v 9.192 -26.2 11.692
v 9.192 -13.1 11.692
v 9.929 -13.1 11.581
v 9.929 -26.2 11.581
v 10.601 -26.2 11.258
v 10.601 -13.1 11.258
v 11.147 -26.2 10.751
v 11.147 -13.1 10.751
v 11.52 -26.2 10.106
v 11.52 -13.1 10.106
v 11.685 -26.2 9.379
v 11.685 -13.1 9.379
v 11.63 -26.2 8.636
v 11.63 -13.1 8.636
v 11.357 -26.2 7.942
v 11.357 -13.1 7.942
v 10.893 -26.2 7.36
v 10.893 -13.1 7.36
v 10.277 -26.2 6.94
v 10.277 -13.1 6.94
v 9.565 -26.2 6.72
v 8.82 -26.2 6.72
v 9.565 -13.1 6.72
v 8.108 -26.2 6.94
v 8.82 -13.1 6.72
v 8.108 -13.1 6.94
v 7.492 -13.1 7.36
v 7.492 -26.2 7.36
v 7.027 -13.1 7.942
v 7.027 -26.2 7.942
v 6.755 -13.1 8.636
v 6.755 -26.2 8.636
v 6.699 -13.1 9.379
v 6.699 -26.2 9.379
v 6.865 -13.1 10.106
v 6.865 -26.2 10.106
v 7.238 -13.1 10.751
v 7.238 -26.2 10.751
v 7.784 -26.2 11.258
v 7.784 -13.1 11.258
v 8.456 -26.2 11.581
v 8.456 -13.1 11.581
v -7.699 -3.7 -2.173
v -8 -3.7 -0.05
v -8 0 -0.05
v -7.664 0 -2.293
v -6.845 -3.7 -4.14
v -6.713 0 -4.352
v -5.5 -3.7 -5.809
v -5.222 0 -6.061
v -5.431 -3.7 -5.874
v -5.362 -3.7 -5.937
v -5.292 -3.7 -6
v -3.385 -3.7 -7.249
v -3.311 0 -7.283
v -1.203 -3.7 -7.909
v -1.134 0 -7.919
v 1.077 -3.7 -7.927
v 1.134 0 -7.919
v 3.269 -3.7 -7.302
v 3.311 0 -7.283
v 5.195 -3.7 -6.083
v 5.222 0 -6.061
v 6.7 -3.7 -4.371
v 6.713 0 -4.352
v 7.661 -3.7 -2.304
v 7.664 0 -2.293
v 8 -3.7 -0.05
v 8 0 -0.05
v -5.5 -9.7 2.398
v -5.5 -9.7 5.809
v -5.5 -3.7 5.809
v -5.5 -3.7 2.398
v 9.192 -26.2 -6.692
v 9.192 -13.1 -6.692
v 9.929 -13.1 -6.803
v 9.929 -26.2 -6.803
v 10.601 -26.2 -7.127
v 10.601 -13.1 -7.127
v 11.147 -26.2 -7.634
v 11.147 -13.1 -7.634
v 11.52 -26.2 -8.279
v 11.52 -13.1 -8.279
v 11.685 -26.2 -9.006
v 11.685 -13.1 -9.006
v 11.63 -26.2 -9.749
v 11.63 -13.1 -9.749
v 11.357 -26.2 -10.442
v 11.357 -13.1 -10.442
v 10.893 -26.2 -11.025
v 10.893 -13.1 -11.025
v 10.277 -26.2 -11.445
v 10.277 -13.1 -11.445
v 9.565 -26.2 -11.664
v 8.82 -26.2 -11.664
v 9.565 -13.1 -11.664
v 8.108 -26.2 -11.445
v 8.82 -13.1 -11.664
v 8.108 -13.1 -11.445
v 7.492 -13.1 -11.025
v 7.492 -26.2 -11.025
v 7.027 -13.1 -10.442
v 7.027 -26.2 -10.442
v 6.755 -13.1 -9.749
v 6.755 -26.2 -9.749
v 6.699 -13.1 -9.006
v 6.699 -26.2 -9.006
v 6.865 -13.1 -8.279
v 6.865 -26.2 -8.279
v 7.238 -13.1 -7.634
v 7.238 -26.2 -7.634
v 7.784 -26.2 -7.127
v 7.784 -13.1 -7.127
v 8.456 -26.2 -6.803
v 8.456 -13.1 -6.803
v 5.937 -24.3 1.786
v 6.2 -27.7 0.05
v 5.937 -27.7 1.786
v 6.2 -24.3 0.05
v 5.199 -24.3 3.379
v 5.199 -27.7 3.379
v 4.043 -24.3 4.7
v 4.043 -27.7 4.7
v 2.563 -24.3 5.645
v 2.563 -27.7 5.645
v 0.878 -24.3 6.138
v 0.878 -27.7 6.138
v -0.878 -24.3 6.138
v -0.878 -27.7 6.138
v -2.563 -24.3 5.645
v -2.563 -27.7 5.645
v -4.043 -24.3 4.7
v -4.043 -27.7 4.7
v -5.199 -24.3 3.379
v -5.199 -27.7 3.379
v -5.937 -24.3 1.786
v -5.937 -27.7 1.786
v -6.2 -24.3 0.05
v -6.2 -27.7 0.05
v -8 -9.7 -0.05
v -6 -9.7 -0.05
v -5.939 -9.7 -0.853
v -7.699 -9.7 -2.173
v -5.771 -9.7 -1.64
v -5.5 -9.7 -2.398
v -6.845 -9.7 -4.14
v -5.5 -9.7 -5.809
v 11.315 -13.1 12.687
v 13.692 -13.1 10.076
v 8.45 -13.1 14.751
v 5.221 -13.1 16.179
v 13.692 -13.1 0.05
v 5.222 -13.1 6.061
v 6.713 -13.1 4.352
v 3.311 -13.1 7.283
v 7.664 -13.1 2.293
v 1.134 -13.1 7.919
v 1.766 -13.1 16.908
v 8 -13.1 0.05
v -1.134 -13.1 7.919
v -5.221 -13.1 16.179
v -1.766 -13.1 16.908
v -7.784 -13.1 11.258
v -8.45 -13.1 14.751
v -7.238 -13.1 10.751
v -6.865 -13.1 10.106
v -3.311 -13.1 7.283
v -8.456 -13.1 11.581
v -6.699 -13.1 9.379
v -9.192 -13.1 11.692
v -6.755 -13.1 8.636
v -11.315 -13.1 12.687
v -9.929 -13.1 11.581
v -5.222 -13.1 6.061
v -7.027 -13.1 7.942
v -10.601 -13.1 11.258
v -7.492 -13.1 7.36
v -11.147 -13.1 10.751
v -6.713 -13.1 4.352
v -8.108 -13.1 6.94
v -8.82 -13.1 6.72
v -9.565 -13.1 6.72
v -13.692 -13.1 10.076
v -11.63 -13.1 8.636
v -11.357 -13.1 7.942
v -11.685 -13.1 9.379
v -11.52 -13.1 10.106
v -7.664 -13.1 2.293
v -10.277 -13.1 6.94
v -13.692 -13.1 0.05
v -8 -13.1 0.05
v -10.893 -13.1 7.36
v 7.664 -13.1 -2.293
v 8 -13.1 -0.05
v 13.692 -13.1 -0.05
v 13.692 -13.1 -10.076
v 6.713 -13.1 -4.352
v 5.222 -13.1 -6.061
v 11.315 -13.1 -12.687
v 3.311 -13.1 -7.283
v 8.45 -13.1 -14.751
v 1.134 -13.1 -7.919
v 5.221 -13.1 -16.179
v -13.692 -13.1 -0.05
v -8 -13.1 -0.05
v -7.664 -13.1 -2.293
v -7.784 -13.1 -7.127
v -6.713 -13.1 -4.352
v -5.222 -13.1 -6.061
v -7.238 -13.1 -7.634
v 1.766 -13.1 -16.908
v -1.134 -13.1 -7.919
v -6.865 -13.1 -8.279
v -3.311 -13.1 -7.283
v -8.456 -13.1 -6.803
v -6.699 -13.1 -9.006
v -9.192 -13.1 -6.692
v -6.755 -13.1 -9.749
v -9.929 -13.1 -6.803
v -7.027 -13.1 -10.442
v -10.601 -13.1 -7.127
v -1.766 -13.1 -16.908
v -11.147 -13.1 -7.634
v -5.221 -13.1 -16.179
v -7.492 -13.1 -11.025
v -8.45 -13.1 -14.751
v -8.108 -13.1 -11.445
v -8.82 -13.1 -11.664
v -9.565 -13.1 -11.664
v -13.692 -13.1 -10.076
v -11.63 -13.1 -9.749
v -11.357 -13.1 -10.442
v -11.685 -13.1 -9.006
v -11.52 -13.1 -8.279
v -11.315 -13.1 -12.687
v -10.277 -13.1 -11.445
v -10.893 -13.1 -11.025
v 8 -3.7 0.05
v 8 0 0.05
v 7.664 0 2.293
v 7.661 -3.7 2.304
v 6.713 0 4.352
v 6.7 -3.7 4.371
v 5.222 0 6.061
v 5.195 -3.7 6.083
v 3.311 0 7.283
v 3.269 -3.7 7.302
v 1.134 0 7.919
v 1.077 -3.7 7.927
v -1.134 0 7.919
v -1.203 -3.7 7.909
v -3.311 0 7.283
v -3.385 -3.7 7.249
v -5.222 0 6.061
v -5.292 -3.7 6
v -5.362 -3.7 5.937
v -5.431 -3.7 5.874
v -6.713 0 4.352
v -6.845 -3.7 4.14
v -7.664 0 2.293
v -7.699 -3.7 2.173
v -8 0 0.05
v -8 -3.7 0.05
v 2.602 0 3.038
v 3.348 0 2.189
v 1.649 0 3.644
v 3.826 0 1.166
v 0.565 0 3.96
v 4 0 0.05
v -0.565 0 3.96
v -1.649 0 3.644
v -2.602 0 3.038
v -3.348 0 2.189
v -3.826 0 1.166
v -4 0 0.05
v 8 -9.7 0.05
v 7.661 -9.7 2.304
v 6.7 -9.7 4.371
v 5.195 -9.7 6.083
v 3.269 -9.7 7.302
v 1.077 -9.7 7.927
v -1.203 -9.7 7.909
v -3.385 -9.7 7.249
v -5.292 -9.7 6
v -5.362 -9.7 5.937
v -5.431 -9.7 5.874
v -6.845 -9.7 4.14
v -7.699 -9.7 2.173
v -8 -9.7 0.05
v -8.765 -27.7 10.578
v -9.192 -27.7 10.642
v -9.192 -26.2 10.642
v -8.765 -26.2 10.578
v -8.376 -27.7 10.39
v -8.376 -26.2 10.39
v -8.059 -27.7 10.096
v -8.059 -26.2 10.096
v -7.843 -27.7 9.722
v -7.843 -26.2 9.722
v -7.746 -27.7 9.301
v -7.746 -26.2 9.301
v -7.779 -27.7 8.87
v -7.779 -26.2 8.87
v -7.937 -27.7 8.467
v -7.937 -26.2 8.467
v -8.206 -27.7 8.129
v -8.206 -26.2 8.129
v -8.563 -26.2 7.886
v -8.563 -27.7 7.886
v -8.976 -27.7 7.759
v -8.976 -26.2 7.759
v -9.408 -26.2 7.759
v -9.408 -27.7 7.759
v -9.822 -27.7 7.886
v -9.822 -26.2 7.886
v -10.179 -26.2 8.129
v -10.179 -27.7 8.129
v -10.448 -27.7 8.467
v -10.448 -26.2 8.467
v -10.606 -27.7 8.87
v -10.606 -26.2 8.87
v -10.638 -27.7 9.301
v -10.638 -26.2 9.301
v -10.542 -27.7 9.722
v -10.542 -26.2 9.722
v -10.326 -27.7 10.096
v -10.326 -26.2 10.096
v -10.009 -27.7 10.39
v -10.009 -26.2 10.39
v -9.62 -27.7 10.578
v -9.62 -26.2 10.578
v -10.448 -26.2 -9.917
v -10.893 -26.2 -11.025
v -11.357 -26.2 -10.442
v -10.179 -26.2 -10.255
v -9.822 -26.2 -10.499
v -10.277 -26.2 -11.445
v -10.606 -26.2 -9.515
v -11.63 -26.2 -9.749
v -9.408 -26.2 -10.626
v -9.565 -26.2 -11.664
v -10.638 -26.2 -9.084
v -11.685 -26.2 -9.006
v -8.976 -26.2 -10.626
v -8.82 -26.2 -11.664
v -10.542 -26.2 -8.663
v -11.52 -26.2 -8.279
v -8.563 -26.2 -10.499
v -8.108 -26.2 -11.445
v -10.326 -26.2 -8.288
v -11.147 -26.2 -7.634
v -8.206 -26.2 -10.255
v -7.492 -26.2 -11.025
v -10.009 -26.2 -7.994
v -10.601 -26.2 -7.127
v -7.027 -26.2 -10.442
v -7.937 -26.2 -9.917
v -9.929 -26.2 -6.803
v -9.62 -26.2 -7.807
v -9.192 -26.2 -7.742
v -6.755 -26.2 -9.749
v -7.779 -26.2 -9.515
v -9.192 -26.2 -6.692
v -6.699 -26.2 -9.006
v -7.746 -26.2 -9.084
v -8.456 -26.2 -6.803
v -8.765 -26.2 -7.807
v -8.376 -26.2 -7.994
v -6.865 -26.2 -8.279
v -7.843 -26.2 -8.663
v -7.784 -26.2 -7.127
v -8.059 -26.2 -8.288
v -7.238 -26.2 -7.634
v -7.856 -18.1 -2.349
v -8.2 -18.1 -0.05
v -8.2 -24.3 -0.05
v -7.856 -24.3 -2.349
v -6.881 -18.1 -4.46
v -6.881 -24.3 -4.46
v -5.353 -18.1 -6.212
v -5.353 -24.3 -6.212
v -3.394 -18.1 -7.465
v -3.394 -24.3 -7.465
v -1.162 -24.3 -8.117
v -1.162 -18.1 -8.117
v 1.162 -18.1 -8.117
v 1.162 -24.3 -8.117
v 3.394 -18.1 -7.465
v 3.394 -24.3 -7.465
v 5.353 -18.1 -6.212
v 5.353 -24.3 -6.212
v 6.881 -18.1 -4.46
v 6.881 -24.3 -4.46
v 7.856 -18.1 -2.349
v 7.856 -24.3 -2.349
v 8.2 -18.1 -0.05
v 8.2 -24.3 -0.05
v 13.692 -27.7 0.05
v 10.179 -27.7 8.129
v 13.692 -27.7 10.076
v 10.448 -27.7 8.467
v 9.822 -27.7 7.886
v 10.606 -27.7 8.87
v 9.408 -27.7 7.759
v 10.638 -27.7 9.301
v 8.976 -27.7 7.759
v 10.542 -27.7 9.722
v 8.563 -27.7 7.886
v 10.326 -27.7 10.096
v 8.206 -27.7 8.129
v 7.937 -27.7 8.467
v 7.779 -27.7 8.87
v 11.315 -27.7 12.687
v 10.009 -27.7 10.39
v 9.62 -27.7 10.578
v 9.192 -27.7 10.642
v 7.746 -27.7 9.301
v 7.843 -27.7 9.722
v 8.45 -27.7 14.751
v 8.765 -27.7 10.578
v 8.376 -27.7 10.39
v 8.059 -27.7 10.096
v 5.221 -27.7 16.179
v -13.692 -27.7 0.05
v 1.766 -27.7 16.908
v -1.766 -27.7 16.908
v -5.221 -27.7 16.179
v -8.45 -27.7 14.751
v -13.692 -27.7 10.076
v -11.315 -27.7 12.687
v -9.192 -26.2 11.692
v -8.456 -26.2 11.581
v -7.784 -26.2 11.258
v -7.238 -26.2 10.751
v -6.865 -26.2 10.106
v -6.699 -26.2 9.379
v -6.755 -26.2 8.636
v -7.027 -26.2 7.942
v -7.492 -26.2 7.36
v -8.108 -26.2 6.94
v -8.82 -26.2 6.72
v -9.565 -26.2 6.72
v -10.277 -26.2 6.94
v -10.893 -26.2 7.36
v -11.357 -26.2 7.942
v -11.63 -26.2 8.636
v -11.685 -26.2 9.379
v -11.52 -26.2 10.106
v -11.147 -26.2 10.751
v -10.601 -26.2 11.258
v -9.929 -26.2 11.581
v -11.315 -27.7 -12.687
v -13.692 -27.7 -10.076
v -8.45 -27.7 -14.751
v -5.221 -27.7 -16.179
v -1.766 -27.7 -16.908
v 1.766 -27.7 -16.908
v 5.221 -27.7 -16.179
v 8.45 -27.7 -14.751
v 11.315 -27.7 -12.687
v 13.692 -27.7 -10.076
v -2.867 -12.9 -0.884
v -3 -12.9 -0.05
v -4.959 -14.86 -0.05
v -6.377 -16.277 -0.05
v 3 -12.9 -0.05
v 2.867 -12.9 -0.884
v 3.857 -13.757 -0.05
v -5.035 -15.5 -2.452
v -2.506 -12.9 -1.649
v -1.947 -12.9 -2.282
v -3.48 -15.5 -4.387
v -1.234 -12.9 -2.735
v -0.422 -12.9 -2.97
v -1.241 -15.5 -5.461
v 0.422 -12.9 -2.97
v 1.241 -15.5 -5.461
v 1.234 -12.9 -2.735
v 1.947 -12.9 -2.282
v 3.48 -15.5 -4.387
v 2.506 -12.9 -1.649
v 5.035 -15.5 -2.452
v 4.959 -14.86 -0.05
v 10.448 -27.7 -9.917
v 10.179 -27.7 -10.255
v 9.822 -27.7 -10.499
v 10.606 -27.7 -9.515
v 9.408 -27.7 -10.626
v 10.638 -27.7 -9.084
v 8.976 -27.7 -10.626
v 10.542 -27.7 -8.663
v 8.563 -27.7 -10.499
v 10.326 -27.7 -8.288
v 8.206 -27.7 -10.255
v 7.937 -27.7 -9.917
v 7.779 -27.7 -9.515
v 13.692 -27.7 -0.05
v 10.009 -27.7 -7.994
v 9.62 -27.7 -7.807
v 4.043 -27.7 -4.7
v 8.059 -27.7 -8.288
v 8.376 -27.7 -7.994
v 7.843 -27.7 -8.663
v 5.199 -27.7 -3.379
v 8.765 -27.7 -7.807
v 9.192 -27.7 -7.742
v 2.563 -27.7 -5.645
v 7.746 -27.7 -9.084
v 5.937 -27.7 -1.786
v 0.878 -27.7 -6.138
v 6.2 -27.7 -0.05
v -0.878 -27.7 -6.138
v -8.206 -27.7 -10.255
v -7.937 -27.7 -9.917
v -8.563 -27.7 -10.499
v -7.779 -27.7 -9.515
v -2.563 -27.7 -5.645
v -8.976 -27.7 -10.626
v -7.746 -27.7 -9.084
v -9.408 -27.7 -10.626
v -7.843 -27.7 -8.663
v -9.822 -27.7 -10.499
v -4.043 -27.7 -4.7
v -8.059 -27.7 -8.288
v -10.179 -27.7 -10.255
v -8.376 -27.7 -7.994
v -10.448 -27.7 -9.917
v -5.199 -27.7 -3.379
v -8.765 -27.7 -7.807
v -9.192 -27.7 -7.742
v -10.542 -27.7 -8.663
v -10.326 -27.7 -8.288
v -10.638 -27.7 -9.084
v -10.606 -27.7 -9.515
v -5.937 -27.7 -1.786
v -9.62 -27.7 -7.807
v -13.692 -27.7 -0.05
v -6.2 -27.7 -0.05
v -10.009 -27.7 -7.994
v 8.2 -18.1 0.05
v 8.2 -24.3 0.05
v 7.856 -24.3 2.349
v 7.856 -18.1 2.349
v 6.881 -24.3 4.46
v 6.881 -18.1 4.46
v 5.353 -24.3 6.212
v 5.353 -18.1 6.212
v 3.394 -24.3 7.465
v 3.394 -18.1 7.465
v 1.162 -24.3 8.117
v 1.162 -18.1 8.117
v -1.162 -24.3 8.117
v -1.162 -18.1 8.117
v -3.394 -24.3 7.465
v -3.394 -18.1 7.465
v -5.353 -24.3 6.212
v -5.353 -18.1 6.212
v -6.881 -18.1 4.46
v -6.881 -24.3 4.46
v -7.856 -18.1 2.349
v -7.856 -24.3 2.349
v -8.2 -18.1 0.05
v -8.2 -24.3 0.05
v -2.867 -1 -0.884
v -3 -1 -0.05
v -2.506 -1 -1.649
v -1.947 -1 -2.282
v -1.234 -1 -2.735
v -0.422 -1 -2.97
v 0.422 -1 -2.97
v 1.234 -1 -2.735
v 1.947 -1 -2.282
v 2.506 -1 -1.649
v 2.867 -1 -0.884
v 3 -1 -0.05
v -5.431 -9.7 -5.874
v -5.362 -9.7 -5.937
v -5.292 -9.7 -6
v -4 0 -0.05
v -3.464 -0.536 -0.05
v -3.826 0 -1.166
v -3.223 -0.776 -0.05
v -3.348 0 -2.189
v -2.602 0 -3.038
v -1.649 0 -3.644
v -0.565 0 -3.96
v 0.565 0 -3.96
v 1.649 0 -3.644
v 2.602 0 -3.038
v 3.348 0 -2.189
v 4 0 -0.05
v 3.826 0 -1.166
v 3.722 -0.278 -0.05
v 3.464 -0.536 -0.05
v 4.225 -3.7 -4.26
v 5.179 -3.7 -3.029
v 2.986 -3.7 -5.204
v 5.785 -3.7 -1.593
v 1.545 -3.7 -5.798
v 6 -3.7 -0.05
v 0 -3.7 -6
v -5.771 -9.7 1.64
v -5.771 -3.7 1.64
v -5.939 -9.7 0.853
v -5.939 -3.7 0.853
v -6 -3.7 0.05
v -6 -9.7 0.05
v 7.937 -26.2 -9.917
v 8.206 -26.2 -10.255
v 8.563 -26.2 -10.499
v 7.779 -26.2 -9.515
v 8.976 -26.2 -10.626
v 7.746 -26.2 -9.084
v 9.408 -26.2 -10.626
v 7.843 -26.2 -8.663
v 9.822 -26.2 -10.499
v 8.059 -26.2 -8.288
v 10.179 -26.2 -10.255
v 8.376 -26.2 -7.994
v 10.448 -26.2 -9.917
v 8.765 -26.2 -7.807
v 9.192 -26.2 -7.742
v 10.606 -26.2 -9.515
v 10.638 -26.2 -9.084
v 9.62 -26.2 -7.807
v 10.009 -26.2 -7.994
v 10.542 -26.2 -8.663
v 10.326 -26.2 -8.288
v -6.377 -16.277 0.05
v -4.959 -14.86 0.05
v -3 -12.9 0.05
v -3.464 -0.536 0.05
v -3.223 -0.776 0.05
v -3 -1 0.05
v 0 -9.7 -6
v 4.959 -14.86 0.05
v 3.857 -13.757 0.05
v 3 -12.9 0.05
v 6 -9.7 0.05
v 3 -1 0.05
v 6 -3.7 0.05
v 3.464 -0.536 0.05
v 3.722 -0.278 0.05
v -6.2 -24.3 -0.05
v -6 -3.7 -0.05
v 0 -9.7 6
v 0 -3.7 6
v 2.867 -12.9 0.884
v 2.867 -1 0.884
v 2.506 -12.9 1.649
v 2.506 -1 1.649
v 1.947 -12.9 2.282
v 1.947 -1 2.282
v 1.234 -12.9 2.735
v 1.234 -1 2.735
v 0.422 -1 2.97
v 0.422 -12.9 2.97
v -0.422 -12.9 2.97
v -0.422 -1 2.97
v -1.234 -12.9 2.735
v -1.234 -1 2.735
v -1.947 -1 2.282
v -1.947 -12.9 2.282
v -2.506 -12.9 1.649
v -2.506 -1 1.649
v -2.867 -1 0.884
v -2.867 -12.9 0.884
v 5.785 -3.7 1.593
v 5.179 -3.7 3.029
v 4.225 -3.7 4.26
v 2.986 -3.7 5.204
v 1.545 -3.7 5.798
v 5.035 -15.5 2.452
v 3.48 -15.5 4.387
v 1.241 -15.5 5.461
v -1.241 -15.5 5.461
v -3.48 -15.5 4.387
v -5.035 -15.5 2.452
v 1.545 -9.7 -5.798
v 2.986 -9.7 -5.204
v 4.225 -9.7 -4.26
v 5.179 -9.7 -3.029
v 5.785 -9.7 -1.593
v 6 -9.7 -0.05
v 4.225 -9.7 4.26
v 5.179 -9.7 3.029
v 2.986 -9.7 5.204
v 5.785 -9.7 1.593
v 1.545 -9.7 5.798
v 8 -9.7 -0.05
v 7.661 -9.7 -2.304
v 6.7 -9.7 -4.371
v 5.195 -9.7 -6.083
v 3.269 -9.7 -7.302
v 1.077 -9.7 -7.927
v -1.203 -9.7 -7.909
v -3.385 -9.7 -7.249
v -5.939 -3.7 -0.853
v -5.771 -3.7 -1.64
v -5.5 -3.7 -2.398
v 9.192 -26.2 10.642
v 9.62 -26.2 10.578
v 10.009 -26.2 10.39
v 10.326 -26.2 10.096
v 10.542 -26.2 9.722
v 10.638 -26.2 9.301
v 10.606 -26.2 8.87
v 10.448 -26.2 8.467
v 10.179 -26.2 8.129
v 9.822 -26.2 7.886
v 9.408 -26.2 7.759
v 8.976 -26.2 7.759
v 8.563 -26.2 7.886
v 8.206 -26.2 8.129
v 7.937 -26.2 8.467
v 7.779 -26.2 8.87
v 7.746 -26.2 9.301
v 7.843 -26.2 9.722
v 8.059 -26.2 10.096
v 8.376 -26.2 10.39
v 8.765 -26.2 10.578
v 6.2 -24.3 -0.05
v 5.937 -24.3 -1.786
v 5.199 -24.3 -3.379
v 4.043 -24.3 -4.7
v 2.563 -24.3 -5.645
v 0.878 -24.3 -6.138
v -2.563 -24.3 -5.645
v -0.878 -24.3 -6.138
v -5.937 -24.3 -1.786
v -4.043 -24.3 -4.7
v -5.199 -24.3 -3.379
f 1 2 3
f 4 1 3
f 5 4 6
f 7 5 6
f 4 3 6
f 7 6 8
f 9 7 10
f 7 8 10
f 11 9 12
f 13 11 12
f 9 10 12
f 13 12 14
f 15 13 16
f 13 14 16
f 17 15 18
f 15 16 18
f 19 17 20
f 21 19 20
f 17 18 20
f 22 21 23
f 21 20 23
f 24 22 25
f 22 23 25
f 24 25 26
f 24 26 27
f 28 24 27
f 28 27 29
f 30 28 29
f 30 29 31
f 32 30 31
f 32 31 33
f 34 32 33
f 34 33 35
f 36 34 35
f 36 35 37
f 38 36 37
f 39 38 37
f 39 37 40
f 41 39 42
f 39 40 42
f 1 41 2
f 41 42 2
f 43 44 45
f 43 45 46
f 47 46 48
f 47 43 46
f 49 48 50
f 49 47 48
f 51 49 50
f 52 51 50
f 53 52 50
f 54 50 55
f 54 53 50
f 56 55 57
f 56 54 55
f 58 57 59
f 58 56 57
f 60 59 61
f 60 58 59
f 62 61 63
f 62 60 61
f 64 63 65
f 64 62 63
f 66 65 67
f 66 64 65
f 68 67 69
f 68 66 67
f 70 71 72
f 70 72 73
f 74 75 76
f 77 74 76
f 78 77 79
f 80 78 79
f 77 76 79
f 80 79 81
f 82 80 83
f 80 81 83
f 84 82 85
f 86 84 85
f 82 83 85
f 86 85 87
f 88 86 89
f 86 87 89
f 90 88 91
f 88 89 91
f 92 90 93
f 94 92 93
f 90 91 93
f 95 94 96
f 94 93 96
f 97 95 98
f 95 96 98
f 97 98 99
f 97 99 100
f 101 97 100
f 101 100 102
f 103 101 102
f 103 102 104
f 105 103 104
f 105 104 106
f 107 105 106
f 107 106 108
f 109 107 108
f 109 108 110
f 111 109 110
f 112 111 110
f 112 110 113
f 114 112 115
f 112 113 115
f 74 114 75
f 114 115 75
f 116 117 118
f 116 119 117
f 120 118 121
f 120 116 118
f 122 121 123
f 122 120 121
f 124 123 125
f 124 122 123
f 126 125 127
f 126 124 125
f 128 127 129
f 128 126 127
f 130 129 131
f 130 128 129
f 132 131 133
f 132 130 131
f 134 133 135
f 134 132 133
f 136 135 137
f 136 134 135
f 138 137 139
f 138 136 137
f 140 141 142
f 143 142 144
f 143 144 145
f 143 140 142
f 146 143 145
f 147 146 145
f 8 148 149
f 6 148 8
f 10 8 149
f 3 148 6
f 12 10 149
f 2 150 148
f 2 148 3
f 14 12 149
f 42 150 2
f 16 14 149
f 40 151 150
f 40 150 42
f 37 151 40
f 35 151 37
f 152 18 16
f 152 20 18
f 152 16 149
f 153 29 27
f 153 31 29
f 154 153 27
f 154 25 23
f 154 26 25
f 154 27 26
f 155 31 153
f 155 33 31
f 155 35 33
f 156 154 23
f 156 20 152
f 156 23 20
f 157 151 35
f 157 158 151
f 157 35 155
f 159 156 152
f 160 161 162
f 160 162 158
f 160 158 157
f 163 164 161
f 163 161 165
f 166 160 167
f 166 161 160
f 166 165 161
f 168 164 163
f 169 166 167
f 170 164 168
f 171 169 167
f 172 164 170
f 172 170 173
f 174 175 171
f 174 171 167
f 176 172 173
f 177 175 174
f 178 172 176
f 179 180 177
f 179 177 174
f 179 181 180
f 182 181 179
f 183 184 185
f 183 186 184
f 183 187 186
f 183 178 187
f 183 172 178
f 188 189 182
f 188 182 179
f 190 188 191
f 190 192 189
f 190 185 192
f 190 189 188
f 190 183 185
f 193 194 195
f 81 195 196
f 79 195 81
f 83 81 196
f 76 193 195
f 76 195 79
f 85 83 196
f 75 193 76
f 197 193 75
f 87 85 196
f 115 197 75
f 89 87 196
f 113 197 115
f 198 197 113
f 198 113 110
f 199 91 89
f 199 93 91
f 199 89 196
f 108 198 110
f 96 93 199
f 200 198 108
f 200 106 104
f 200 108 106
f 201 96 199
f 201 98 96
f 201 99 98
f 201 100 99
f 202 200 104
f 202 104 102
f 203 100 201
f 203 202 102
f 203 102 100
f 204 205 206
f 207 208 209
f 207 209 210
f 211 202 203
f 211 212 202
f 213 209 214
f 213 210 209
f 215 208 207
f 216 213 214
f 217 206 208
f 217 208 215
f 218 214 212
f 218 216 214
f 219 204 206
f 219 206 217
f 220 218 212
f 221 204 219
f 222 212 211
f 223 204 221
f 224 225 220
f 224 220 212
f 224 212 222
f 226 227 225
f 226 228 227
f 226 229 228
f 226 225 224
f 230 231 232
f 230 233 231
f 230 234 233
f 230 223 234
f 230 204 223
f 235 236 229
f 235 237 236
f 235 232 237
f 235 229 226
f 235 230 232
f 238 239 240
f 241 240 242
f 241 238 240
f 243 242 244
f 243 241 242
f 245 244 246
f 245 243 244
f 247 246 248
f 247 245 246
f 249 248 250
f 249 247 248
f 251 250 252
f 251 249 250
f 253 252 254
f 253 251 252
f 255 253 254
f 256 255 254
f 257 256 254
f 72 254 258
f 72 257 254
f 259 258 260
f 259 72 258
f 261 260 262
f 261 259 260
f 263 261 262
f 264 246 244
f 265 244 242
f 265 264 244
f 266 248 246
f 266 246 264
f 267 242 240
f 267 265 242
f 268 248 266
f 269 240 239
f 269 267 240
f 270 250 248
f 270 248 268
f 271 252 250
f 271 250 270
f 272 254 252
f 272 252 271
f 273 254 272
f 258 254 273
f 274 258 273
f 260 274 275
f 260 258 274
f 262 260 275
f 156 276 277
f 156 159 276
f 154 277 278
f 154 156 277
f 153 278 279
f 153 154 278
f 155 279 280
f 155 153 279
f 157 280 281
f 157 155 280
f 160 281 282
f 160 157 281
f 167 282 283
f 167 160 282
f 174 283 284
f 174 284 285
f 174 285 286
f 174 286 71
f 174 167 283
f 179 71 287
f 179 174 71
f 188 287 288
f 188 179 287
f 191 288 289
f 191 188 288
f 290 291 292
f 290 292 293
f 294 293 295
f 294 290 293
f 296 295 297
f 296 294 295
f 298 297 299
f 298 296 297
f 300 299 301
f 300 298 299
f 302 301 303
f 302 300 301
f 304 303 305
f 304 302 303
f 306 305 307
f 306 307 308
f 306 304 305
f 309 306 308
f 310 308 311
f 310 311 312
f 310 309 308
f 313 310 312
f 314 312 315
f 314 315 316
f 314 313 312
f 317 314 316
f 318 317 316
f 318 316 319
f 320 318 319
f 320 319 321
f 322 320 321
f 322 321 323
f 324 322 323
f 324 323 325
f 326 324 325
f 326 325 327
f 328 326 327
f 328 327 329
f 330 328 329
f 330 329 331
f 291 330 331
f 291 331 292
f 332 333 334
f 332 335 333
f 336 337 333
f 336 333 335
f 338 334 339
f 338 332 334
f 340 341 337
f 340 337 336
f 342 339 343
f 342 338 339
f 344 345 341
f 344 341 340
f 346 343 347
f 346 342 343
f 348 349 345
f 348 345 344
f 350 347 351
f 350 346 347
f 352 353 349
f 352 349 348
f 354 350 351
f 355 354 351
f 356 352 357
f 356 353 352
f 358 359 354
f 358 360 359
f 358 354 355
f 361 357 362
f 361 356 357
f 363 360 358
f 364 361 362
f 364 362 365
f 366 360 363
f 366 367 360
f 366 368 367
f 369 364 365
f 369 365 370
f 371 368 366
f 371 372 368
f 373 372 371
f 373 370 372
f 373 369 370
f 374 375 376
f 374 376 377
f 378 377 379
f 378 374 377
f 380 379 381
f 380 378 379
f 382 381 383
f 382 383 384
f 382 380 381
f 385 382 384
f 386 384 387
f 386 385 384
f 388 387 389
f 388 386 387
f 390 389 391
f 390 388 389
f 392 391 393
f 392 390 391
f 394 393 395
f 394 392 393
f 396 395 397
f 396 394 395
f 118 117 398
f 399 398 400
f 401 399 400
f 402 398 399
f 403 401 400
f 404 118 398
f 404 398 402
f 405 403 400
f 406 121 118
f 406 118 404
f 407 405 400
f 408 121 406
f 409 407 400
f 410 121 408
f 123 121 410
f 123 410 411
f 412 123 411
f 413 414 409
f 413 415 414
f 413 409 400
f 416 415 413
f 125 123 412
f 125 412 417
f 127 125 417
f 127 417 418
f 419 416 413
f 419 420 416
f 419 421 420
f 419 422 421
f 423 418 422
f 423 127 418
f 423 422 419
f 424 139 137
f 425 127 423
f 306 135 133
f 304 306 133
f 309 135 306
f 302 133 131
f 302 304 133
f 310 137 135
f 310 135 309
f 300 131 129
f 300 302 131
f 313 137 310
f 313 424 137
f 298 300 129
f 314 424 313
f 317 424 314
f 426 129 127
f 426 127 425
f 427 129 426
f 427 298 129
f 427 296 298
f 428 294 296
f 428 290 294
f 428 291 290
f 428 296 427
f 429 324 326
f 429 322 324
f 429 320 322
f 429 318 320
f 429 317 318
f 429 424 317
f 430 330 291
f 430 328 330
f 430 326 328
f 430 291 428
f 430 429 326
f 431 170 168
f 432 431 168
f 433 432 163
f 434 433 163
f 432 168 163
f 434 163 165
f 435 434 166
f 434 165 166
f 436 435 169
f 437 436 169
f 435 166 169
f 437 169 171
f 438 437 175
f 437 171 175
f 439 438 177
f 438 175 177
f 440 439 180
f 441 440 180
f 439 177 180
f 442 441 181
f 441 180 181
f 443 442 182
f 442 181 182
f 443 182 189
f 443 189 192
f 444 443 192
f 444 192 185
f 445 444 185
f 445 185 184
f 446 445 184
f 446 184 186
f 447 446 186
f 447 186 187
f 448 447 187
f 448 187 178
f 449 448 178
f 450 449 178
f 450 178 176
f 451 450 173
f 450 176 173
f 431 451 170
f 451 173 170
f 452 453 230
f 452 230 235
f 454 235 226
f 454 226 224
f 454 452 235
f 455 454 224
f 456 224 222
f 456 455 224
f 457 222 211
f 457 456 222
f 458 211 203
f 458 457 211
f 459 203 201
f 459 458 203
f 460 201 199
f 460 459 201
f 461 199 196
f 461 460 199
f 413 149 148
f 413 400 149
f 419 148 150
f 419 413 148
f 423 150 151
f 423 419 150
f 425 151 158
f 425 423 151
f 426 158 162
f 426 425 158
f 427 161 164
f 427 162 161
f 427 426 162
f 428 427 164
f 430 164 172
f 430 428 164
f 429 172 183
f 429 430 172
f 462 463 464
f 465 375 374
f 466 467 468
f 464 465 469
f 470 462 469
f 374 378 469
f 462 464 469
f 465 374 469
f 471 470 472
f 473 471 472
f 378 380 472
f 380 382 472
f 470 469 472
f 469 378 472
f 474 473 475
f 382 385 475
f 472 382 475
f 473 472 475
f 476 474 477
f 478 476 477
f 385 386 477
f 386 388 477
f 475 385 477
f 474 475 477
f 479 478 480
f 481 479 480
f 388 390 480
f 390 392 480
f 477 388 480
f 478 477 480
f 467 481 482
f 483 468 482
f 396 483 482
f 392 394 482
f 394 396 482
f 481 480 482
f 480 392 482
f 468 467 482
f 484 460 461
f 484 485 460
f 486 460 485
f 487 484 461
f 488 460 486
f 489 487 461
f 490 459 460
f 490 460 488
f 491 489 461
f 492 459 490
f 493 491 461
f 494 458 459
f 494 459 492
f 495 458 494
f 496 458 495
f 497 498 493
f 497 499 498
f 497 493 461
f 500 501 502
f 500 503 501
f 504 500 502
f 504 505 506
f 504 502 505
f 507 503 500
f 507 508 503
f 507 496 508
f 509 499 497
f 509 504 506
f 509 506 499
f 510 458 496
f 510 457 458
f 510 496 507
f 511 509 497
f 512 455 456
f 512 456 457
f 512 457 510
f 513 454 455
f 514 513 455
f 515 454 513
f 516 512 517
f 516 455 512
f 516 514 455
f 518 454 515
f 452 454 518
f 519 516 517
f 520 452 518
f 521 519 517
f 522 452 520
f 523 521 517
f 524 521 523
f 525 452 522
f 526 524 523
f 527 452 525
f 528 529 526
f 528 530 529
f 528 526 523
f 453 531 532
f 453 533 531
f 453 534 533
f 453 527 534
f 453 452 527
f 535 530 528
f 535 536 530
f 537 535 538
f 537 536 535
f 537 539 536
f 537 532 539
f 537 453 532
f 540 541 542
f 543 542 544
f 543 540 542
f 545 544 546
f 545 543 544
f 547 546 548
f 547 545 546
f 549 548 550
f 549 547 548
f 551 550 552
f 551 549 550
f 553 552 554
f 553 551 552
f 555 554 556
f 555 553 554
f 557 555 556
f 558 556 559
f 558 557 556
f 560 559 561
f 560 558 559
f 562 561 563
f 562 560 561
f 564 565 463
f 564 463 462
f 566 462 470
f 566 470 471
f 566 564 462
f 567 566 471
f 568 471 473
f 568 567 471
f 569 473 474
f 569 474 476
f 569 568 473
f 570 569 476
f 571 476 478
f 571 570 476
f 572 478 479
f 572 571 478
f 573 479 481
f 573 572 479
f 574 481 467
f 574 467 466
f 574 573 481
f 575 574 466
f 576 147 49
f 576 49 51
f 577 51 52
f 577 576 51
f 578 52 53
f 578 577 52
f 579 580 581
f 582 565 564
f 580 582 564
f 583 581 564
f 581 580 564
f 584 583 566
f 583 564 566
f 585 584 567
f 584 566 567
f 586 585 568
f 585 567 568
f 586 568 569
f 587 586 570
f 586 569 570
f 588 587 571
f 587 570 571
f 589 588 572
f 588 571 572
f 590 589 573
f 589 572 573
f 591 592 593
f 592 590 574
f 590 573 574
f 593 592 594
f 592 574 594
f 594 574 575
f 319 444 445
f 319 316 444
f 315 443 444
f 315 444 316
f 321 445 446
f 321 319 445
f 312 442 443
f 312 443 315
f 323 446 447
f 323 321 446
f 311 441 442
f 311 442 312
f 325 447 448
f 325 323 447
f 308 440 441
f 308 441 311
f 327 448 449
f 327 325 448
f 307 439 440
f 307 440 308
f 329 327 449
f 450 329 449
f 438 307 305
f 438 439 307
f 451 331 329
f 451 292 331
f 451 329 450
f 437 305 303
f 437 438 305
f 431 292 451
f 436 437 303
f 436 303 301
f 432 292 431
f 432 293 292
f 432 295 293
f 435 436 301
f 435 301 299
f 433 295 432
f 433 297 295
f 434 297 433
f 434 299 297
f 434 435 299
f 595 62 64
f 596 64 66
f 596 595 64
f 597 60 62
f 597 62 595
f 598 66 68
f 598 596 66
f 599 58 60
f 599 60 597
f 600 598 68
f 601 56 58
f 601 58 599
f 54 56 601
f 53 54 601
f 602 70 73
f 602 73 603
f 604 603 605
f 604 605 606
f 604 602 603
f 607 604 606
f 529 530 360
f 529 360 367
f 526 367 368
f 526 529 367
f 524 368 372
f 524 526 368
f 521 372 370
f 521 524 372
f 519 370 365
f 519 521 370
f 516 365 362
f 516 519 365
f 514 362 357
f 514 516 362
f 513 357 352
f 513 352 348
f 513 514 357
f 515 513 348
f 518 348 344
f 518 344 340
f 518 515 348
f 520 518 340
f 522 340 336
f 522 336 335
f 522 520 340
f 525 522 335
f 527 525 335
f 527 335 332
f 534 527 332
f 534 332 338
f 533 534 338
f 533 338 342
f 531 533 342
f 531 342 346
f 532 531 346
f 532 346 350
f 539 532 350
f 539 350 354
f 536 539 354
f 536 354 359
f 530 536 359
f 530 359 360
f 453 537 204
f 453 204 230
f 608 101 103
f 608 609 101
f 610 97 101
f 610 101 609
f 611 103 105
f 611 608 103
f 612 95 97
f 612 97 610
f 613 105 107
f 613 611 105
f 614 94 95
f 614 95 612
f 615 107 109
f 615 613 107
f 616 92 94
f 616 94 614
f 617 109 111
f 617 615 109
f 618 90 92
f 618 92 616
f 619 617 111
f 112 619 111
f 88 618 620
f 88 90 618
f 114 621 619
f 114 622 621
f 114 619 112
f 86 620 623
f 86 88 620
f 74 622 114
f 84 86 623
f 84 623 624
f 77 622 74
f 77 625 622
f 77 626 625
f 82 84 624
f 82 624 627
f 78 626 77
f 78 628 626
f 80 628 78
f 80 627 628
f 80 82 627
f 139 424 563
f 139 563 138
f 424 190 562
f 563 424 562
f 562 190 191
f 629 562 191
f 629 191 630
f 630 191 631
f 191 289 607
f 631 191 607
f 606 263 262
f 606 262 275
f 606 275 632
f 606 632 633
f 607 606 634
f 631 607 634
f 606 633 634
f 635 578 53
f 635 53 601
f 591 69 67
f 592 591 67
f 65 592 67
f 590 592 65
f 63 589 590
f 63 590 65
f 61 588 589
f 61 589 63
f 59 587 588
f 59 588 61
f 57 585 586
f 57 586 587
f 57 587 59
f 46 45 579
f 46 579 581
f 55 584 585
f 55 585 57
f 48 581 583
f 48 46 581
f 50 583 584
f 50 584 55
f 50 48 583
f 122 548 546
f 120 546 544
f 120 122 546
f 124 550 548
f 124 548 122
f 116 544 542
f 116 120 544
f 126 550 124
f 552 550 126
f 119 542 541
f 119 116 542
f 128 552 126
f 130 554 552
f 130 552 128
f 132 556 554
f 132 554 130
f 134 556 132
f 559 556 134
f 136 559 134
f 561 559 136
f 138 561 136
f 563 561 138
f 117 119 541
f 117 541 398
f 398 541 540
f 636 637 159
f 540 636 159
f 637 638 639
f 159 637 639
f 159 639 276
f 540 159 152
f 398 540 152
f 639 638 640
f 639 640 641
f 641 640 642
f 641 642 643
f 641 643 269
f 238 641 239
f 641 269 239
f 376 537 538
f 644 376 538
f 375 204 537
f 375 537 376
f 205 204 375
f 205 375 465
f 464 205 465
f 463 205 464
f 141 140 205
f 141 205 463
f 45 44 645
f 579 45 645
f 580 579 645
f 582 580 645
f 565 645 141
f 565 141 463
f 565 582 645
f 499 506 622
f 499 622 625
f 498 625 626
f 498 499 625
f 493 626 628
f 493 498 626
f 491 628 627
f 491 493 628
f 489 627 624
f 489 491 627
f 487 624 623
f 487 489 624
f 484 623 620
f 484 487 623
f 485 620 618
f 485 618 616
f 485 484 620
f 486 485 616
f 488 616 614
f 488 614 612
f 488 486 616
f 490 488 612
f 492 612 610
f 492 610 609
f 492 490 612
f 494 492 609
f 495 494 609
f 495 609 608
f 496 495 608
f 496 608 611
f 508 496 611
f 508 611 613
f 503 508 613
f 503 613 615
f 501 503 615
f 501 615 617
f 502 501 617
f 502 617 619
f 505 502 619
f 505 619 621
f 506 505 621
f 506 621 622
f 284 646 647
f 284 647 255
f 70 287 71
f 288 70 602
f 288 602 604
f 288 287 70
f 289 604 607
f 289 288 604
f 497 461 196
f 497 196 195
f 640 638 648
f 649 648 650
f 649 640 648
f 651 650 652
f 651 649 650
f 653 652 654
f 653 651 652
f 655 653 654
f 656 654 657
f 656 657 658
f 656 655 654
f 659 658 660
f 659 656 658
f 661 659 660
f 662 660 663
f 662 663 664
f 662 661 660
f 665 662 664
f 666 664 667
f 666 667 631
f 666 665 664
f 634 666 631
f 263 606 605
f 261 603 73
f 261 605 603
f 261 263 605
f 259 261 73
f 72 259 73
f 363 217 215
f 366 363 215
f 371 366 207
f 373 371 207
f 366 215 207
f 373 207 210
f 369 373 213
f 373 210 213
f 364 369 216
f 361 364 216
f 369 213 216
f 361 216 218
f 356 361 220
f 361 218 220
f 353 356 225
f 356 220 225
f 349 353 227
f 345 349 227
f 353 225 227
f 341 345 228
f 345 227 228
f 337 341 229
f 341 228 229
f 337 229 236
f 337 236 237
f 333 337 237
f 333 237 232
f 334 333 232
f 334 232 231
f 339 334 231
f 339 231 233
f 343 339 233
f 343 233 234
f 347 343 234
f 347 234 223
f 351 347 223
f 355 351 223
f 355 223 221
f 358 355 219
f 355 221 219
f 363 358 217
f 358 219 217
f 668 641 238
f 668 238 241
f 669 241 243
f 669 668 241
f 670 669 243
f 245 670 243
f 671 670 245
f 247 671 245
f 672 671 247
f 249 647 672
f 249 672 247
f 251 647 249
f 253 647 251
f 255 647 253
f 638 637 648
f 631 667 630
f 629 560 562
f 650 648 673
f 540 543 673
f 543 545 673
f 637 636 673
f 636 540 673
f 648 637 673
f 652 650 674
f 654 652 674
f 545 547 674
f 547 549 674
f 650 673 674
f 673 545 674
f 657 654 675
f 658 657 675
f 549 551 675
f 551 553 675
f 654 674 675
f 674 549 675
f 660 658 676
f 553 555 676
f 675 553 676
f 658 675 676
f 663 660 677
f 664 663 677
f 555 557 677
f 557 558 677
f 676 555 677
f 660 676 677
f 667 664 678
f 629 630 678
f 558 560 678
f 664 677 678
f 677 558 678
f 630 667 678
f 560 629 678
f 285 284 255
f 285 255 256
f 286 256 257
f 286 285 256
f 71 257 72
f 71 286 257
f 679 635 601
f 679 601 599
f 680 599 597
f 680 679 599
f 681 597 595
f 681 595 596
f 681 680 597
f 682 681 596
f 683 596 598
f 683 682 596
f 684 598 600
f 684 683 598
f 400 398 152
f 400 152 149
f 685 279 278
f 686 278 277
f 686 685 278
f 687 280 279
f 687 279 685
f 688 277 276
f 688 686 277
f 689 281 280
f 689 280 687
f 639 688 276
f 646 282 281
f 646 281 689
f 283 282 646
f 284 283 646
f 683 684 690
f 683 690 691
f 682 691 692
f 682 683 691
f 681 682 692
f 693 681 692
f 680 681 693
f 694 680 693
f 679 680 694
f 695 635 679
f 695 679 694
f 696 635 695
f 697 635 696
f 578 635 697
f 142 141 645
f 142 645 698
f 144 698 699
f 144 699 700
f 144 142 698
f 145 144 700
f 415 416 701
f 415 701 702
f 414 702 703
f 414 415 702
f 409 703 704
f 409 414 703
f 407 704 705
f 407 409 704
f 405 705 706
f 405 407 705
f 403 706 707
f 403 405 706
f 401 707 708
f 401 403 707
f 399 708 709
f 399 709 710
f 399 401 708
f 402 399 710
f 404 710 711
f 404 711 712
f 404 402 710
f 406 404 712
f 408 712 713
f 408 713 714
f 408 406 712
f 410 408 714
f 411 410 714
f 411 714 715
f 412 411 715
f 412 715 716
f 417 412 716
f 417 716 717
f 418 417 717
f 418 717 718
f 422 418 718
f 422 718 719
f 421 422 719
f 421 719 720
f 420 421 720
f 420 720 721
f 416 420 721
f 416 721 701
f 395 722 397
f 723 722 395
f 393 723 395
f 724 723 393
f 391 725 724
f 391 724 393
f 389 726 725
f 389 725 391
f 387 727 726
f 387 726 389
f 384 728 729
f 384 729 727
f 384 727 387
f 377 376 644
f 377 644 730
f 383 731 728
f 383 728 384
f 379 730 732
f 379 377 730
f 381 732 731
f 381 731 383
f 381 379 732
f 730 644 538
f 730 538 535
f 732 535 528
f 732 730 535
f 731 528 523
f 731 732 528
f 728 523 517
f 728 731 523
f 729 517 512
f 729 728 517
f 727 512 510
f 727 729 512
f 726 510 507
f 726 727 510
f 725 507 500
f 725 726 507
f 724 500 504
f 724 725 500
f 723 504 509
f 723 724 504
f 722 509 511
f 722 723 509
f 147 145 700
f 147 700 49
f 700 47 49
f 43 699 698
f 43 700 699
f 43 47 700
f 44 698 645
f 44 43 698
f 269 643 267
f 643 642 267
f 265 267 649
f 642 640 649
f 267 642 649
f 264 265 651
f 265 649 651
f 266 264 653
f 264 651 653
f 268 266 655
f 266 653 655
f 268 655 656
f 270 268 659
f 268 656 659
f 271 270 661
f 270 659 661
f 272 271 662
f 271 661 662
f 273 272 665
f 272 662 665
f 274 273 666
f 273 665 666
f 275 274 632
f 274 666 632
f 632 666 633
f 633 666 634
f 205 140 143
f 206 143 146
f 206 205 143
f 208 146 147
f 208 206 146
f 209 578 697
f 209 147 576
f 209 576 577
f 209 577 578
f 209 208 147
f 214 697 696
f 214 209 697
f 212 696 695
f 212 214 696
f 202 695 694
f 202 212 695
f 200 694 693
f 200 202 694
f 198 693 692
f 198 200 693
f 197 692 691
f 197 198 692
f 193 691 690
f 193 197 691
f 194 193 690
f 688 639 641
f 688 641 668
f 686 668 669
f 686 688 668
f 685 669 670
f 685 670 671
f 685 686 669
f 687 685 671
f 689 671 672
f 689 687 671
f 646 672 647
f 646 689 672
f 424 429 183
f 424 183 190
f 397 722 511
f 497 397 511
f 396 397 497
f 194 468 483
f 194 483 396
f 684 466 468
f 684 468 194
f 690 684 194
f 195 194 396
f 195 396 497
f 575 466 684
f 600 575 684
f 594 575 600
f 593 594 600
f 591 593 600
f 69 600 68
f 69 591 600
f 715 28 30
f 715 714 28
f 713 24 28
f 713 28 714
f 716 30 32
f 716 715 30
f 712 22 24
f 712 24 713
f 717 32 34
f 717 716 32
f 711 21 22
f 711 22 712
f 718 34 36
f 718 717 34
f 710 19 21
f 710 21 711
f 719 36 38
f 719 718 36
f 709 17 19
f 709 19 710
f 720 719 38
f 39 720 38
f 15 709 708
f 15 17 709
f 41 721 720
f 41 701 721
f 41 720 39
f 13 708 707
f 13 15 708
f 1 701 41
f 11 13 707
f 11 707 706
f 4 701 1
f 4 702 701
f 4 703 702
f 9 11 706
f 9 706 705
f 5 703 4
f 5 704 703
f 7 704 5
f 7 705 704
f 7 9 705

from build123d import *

# Parameters (mm, degrees)
SKETCH1_W               = 8.8
SKETCH1_H               = 6.2
CUT_EXTRUDE2_DEPTH      = 29.12756655
CUT_EXTRUDE2_DEPTH_BACK = 29.12756655
SKETCH4_R               = 1.45
SKETCH4_3_R             = 2.5
SKETCH4_3_R_2           = 1.45
CUT_EXTRUDE3_DEPTH      = 13.1
CHAMFER1_SIZE           = 1
BOSS_EXTRUDE1_START     = 6
BOSS_EXTRUDE1_DEPTH     = 6
CHAMFER2_SIZE           = 5.2
SKETCH2_W               = 100
SKETCH2_H               = 100
CUT_EXTRUDE1_DEPTH      = 0.05
CUT_EXTRUDE4_START      = -14.6
CUT_EXTRUDE4_DEPTH      = 14.6


# Read off the part's stored shape, not the designer's step: Cut-Extrude4
with BuildPart() as part:
    # Sketch1 → Revolve1 (revolve)
    with BuildSketch(Plane.XY, mode=Mode.PRIVATE) as revolve1_sk:
        Polygon((-3, -13.1), (-3, 0), (-8, 0), (-8, -3.7), (-6, -3.7), (-6, -9.7), (-8, -9.7), (-8, -13.1), align=None)
        Polygon((-3, -18.1), (-3, -13.1), (-8, -13.1), (-17, -13.1), (-17, -18.1), (-8.2, -18.1), align=None)
        with Locations((-12.6, -21.2)):
            Rectangle(SKETCH1_W, SKETCH1_H)
        Polygon((-6.2, -24.3), (-8.2, -24.3), (-17, -24.3), (-17, -27.7), (-6.2, -27.7), align=None)
    revolve(revolve1_sk.sketch.rotate(Axis((0, 21.737527327, 0), (0, -1, 0)), 270), axis=Axis((0, 21.737527327, 0), (0, -1, 0)))

    # Sketch4 → Cut-Extrude2 (cut, two sides: drawn at the far end of the back side and taken through both)
    with BuildSketch(Plane(origin=(0, -13.1, 0), x_dir=(1, 0, 0), z_dir=(0, 1, 0)).offset(-CUT_EXTRUDE2_DEPTH_BACK)):
        with Locations(Location((-9.192388155, 9.192388155, 0), (0, 0, 270))):
            Circle(SKETCH4_R)
        with Locations(Location((9.192388155, 9.192388155, 0), (0, 0, 270))):
            Circle(SKETCH4_R)
        with Locations(Location((9.192388155, -9.192388155, 0), (0, 0, 270))):
            Circle(SKETCH4_R)
        with Locations(Location((-9.192388155, -9.192388155, 0), (0, 0, 270))):
            Circle(SKETCH4_R)
    extrude(amount=CUT_EXTRUDE2_DEPTH + CUT_EXTRUDE2_DEPTH_BACK, mode=Mode.SUBTRACT)

    # Sketch4<3> → Cut-Extrude3 (cut)
    # profile 1 of 5: a face of its own
    with BuildSketch(Plane(origin=(0, -13.1, 0), x_dir=(1, 0, 0), z_dir=(0, 1, 0))):
        with Locations(Location((9.192388155, 9.192388155, 0), (0, 0, 270))):
            Circle(SKETCH4_3_R)
        with Locations(Location((9.192388155, 9.192388155, 0), (0, 0, 270))):
            Circle(SKETCH4_3_R_2, mode=Mode.SUBTRACT)
    # profile 2 of 5: a face of its own
    with BuildSketch(Plane(origin=(0, -13.1, 0), x_dir=(1, 0, 0), z_dir=(0, 1, 0))):
        with Locations(Location((9.192388155, -9.192388155, 0), (0, 0, 270))):
            Circle(SKETCH4_3_R)
        with Locations(Location((9.192388155, -9.192388155, 0), (0, 0, 270))):
            Circle(SKETCH4_3_R_2, mode=Mode.SUBTRACT)
    # profile 3 of 5: a face of its own
    with BuildSketch(Plane(origin=(0, -13.1, 0), x_dir=(1, 0, 0), z_dir=(0, 1, 0))):
        with Locations(Location((-9.192388155, -9.192388155, 0), (0, 0, 270))):
            Circle(SKETCH4_3_R)
        with Locations(Location((-9.192388155, -9.192388155, 0), (0, 0, 270))):
            Circle(SKETCH4_3_R_2, mode=Mode.SUBTRACT)
    # profile 4 of 5: a face of its own
    with BuildSketch(Plane(origin=(0, -13.1, 0), x_dir=(1, 0, 0), z_dir=(0, 1, 0))):
        with Locations(Location((-9.192388155, 9.192388155, 0), (0, 0, 270))):
            Circle(SKETCH4_3_R_2)
    # profile 5 of 5: a face of its own
    with BuildSketch(Plane(origin=(0, -13.1, 0), x_dir=(1, 0, 0), z_dir=(0, 1, 0))):
        with Locations(Location((-9.192388155, 9.192388155, 0), (0, 0, 270))):
            Circle(SKETCH4_3_R)
    extrude(amount=-CUT_EXTRUDE3_DEPTH, mode=Mode.SUBTRACT)

    # Chamfer1
    chamfer1_edges = [part.edges().sort_by_distance(p)[0] for p in [
        (0, 0, -3),
    ]]
    chamfer(chamfer1_edges, length=CHAMFER1_SIZE)

    # Sketch5 → Boss-Extrude1 (add)
    with BuildSketch(Plane.XZ.offset(3.7).offset(BOSS_EXTRUDE1_START)):
        with BuildLine():
            Line((0, 6), (-5.291502622, 6))
            ThreePointArc((-5.291502622, 6), (-5.39659218, 5.905657698), (-5.5, 5.809475019))
            Line((-5.5, 5.809475019), (-5.5, 2.397915762))
            ThreePointArc((-5.5, 2.397915762), (-3.287286528, 5.019337335), (0, 6))
        make_face()
        with BuildLine():
            Line((-5.5, -2.397915762), (-5.5, -5.809475019))
            ThreePointArc((-5.5, -5.809475019), (-5.39659218, -5.905657698), (-5.291502622, -6))
            Line((-5.291502622, -6), (0, -6))
            ThreePointArc((0, -6), (-3.287286528, -5.019337335), (-5.5, -2.397915762))
        make_face()
    extrude(amount=-BOSS_EXTRUDE1_DEPTH)

    # Chamfer2
    chamfer2_edges = [part.edges().sort_by_distance(p)[0] for p in [
        (0, -18.1, -3),
    ]]
    chamfer(chamfer2_edges, length=CHAMFER2_SIZE - 0.0001)  # a hair under: the kernel refuses the full size

    # Sketch2 → Cut-Extrude1 (cut, symmetric)
    with BuildSketch(Plane.XY):
        Rectangle(SKETCH2_W, SKETCH2_H)
    extrude(amount=CUT_EXTRUDE1_DEPTH, both=True, mode=Mode.SUBTRACT)


with BuildPart() as cut_extrude1_piece_1:
    # of the separate pieces the step leaves, piece 1, a body of its own (cut_extrude1_pieces)
    add(part.part.solids().sort_by_distance((-2.999583304, -12.9001, -0.05))[0])


with BuildPart() as cut_extrude1_piece_2:
    # of the separate pieces the step leaves, piece 2, a body of its own (cut_extrude1_pieces)
    add(part.part.solids().sort_by_distance((2.999583304, -12.9001, 0.05))[0])


with BuildPart() as cut_extrude4_tool:
    # Cut-Extrude4 outline → Cut-Extrude4 (new body)
    with BuildSketch(Plane(origin=(0, -13.1, 0), x_dir=(1, 0, 0), z_dir=(0, 1, 0)).offset(CUT_EXTRUDE4_START)):
        with BuildLine():
            ThreePointArc((16.99992647, 0.05), (16.144129117, 5.326076892), (13.692388155, 10.075639265))
            Line((13.692388155, 10.075639265), (13.692388155, 0.05))
            Line((13.692388155, 0.05), (16.99992647, 0.05))
        make_face()
        with BuildLine():
            Line((-13.692388155, 0.05), (-13.692388155, 10.075639265))
            ThreePointArc((-13.692388155, 10.075639265), (-16.144129117, 5.326076892), (-16.99992647, 0.05))
            Line((-16.99992647, 0.05), (-13.692388155, 0.05))
        make_face()
        with BuildLine():
            Line((13.692388155, -0.05), (13.692388155, -10.075639265))
            ThreePointArc((13.692388155, -10.075639265), (16.144129117, -5.326076892), (16.99992647, -0.05))
            Line((16.99992647, -0.05), (13.692388155, -0.05))
        make_face()
        with BuildLine():
            Line((-13.692388155, -10.075639265), (-13.692388155, -0.05))
            Line((-13.692388155, -0.05), (-16.99992647, -0.05))
            ThreePointArc((-16.99992647, -0.05), (-16.144129117, -5.326076892), (-13.692388155, -10.075639265))
        make_face()
    extrude(amount=CUT_EXTRUDE4_DEPTH)


with BuildPart() as cut_extrude1_piece_1_1:
    add(cut_extrude1_piece_1.part)

    # Cut-Extrude4: cut by cut_extrude4_tool
    add(cut_extrude4_tool.part, mode=Mode.SUBTRACT)


with BuildPart() as cut_extrude1_piece_2_1:
    add(cut_extrude1_piece_2.part)

    # Cut-Extrude4: cut by cut_extrude4_tool
    add(cut_extrude4_tool.part, mode=Mode.SUBTRACT)


solid = Compound([cut_extrude1_piece_1_1.part, cut_extrude1_piece_2_1.part])
